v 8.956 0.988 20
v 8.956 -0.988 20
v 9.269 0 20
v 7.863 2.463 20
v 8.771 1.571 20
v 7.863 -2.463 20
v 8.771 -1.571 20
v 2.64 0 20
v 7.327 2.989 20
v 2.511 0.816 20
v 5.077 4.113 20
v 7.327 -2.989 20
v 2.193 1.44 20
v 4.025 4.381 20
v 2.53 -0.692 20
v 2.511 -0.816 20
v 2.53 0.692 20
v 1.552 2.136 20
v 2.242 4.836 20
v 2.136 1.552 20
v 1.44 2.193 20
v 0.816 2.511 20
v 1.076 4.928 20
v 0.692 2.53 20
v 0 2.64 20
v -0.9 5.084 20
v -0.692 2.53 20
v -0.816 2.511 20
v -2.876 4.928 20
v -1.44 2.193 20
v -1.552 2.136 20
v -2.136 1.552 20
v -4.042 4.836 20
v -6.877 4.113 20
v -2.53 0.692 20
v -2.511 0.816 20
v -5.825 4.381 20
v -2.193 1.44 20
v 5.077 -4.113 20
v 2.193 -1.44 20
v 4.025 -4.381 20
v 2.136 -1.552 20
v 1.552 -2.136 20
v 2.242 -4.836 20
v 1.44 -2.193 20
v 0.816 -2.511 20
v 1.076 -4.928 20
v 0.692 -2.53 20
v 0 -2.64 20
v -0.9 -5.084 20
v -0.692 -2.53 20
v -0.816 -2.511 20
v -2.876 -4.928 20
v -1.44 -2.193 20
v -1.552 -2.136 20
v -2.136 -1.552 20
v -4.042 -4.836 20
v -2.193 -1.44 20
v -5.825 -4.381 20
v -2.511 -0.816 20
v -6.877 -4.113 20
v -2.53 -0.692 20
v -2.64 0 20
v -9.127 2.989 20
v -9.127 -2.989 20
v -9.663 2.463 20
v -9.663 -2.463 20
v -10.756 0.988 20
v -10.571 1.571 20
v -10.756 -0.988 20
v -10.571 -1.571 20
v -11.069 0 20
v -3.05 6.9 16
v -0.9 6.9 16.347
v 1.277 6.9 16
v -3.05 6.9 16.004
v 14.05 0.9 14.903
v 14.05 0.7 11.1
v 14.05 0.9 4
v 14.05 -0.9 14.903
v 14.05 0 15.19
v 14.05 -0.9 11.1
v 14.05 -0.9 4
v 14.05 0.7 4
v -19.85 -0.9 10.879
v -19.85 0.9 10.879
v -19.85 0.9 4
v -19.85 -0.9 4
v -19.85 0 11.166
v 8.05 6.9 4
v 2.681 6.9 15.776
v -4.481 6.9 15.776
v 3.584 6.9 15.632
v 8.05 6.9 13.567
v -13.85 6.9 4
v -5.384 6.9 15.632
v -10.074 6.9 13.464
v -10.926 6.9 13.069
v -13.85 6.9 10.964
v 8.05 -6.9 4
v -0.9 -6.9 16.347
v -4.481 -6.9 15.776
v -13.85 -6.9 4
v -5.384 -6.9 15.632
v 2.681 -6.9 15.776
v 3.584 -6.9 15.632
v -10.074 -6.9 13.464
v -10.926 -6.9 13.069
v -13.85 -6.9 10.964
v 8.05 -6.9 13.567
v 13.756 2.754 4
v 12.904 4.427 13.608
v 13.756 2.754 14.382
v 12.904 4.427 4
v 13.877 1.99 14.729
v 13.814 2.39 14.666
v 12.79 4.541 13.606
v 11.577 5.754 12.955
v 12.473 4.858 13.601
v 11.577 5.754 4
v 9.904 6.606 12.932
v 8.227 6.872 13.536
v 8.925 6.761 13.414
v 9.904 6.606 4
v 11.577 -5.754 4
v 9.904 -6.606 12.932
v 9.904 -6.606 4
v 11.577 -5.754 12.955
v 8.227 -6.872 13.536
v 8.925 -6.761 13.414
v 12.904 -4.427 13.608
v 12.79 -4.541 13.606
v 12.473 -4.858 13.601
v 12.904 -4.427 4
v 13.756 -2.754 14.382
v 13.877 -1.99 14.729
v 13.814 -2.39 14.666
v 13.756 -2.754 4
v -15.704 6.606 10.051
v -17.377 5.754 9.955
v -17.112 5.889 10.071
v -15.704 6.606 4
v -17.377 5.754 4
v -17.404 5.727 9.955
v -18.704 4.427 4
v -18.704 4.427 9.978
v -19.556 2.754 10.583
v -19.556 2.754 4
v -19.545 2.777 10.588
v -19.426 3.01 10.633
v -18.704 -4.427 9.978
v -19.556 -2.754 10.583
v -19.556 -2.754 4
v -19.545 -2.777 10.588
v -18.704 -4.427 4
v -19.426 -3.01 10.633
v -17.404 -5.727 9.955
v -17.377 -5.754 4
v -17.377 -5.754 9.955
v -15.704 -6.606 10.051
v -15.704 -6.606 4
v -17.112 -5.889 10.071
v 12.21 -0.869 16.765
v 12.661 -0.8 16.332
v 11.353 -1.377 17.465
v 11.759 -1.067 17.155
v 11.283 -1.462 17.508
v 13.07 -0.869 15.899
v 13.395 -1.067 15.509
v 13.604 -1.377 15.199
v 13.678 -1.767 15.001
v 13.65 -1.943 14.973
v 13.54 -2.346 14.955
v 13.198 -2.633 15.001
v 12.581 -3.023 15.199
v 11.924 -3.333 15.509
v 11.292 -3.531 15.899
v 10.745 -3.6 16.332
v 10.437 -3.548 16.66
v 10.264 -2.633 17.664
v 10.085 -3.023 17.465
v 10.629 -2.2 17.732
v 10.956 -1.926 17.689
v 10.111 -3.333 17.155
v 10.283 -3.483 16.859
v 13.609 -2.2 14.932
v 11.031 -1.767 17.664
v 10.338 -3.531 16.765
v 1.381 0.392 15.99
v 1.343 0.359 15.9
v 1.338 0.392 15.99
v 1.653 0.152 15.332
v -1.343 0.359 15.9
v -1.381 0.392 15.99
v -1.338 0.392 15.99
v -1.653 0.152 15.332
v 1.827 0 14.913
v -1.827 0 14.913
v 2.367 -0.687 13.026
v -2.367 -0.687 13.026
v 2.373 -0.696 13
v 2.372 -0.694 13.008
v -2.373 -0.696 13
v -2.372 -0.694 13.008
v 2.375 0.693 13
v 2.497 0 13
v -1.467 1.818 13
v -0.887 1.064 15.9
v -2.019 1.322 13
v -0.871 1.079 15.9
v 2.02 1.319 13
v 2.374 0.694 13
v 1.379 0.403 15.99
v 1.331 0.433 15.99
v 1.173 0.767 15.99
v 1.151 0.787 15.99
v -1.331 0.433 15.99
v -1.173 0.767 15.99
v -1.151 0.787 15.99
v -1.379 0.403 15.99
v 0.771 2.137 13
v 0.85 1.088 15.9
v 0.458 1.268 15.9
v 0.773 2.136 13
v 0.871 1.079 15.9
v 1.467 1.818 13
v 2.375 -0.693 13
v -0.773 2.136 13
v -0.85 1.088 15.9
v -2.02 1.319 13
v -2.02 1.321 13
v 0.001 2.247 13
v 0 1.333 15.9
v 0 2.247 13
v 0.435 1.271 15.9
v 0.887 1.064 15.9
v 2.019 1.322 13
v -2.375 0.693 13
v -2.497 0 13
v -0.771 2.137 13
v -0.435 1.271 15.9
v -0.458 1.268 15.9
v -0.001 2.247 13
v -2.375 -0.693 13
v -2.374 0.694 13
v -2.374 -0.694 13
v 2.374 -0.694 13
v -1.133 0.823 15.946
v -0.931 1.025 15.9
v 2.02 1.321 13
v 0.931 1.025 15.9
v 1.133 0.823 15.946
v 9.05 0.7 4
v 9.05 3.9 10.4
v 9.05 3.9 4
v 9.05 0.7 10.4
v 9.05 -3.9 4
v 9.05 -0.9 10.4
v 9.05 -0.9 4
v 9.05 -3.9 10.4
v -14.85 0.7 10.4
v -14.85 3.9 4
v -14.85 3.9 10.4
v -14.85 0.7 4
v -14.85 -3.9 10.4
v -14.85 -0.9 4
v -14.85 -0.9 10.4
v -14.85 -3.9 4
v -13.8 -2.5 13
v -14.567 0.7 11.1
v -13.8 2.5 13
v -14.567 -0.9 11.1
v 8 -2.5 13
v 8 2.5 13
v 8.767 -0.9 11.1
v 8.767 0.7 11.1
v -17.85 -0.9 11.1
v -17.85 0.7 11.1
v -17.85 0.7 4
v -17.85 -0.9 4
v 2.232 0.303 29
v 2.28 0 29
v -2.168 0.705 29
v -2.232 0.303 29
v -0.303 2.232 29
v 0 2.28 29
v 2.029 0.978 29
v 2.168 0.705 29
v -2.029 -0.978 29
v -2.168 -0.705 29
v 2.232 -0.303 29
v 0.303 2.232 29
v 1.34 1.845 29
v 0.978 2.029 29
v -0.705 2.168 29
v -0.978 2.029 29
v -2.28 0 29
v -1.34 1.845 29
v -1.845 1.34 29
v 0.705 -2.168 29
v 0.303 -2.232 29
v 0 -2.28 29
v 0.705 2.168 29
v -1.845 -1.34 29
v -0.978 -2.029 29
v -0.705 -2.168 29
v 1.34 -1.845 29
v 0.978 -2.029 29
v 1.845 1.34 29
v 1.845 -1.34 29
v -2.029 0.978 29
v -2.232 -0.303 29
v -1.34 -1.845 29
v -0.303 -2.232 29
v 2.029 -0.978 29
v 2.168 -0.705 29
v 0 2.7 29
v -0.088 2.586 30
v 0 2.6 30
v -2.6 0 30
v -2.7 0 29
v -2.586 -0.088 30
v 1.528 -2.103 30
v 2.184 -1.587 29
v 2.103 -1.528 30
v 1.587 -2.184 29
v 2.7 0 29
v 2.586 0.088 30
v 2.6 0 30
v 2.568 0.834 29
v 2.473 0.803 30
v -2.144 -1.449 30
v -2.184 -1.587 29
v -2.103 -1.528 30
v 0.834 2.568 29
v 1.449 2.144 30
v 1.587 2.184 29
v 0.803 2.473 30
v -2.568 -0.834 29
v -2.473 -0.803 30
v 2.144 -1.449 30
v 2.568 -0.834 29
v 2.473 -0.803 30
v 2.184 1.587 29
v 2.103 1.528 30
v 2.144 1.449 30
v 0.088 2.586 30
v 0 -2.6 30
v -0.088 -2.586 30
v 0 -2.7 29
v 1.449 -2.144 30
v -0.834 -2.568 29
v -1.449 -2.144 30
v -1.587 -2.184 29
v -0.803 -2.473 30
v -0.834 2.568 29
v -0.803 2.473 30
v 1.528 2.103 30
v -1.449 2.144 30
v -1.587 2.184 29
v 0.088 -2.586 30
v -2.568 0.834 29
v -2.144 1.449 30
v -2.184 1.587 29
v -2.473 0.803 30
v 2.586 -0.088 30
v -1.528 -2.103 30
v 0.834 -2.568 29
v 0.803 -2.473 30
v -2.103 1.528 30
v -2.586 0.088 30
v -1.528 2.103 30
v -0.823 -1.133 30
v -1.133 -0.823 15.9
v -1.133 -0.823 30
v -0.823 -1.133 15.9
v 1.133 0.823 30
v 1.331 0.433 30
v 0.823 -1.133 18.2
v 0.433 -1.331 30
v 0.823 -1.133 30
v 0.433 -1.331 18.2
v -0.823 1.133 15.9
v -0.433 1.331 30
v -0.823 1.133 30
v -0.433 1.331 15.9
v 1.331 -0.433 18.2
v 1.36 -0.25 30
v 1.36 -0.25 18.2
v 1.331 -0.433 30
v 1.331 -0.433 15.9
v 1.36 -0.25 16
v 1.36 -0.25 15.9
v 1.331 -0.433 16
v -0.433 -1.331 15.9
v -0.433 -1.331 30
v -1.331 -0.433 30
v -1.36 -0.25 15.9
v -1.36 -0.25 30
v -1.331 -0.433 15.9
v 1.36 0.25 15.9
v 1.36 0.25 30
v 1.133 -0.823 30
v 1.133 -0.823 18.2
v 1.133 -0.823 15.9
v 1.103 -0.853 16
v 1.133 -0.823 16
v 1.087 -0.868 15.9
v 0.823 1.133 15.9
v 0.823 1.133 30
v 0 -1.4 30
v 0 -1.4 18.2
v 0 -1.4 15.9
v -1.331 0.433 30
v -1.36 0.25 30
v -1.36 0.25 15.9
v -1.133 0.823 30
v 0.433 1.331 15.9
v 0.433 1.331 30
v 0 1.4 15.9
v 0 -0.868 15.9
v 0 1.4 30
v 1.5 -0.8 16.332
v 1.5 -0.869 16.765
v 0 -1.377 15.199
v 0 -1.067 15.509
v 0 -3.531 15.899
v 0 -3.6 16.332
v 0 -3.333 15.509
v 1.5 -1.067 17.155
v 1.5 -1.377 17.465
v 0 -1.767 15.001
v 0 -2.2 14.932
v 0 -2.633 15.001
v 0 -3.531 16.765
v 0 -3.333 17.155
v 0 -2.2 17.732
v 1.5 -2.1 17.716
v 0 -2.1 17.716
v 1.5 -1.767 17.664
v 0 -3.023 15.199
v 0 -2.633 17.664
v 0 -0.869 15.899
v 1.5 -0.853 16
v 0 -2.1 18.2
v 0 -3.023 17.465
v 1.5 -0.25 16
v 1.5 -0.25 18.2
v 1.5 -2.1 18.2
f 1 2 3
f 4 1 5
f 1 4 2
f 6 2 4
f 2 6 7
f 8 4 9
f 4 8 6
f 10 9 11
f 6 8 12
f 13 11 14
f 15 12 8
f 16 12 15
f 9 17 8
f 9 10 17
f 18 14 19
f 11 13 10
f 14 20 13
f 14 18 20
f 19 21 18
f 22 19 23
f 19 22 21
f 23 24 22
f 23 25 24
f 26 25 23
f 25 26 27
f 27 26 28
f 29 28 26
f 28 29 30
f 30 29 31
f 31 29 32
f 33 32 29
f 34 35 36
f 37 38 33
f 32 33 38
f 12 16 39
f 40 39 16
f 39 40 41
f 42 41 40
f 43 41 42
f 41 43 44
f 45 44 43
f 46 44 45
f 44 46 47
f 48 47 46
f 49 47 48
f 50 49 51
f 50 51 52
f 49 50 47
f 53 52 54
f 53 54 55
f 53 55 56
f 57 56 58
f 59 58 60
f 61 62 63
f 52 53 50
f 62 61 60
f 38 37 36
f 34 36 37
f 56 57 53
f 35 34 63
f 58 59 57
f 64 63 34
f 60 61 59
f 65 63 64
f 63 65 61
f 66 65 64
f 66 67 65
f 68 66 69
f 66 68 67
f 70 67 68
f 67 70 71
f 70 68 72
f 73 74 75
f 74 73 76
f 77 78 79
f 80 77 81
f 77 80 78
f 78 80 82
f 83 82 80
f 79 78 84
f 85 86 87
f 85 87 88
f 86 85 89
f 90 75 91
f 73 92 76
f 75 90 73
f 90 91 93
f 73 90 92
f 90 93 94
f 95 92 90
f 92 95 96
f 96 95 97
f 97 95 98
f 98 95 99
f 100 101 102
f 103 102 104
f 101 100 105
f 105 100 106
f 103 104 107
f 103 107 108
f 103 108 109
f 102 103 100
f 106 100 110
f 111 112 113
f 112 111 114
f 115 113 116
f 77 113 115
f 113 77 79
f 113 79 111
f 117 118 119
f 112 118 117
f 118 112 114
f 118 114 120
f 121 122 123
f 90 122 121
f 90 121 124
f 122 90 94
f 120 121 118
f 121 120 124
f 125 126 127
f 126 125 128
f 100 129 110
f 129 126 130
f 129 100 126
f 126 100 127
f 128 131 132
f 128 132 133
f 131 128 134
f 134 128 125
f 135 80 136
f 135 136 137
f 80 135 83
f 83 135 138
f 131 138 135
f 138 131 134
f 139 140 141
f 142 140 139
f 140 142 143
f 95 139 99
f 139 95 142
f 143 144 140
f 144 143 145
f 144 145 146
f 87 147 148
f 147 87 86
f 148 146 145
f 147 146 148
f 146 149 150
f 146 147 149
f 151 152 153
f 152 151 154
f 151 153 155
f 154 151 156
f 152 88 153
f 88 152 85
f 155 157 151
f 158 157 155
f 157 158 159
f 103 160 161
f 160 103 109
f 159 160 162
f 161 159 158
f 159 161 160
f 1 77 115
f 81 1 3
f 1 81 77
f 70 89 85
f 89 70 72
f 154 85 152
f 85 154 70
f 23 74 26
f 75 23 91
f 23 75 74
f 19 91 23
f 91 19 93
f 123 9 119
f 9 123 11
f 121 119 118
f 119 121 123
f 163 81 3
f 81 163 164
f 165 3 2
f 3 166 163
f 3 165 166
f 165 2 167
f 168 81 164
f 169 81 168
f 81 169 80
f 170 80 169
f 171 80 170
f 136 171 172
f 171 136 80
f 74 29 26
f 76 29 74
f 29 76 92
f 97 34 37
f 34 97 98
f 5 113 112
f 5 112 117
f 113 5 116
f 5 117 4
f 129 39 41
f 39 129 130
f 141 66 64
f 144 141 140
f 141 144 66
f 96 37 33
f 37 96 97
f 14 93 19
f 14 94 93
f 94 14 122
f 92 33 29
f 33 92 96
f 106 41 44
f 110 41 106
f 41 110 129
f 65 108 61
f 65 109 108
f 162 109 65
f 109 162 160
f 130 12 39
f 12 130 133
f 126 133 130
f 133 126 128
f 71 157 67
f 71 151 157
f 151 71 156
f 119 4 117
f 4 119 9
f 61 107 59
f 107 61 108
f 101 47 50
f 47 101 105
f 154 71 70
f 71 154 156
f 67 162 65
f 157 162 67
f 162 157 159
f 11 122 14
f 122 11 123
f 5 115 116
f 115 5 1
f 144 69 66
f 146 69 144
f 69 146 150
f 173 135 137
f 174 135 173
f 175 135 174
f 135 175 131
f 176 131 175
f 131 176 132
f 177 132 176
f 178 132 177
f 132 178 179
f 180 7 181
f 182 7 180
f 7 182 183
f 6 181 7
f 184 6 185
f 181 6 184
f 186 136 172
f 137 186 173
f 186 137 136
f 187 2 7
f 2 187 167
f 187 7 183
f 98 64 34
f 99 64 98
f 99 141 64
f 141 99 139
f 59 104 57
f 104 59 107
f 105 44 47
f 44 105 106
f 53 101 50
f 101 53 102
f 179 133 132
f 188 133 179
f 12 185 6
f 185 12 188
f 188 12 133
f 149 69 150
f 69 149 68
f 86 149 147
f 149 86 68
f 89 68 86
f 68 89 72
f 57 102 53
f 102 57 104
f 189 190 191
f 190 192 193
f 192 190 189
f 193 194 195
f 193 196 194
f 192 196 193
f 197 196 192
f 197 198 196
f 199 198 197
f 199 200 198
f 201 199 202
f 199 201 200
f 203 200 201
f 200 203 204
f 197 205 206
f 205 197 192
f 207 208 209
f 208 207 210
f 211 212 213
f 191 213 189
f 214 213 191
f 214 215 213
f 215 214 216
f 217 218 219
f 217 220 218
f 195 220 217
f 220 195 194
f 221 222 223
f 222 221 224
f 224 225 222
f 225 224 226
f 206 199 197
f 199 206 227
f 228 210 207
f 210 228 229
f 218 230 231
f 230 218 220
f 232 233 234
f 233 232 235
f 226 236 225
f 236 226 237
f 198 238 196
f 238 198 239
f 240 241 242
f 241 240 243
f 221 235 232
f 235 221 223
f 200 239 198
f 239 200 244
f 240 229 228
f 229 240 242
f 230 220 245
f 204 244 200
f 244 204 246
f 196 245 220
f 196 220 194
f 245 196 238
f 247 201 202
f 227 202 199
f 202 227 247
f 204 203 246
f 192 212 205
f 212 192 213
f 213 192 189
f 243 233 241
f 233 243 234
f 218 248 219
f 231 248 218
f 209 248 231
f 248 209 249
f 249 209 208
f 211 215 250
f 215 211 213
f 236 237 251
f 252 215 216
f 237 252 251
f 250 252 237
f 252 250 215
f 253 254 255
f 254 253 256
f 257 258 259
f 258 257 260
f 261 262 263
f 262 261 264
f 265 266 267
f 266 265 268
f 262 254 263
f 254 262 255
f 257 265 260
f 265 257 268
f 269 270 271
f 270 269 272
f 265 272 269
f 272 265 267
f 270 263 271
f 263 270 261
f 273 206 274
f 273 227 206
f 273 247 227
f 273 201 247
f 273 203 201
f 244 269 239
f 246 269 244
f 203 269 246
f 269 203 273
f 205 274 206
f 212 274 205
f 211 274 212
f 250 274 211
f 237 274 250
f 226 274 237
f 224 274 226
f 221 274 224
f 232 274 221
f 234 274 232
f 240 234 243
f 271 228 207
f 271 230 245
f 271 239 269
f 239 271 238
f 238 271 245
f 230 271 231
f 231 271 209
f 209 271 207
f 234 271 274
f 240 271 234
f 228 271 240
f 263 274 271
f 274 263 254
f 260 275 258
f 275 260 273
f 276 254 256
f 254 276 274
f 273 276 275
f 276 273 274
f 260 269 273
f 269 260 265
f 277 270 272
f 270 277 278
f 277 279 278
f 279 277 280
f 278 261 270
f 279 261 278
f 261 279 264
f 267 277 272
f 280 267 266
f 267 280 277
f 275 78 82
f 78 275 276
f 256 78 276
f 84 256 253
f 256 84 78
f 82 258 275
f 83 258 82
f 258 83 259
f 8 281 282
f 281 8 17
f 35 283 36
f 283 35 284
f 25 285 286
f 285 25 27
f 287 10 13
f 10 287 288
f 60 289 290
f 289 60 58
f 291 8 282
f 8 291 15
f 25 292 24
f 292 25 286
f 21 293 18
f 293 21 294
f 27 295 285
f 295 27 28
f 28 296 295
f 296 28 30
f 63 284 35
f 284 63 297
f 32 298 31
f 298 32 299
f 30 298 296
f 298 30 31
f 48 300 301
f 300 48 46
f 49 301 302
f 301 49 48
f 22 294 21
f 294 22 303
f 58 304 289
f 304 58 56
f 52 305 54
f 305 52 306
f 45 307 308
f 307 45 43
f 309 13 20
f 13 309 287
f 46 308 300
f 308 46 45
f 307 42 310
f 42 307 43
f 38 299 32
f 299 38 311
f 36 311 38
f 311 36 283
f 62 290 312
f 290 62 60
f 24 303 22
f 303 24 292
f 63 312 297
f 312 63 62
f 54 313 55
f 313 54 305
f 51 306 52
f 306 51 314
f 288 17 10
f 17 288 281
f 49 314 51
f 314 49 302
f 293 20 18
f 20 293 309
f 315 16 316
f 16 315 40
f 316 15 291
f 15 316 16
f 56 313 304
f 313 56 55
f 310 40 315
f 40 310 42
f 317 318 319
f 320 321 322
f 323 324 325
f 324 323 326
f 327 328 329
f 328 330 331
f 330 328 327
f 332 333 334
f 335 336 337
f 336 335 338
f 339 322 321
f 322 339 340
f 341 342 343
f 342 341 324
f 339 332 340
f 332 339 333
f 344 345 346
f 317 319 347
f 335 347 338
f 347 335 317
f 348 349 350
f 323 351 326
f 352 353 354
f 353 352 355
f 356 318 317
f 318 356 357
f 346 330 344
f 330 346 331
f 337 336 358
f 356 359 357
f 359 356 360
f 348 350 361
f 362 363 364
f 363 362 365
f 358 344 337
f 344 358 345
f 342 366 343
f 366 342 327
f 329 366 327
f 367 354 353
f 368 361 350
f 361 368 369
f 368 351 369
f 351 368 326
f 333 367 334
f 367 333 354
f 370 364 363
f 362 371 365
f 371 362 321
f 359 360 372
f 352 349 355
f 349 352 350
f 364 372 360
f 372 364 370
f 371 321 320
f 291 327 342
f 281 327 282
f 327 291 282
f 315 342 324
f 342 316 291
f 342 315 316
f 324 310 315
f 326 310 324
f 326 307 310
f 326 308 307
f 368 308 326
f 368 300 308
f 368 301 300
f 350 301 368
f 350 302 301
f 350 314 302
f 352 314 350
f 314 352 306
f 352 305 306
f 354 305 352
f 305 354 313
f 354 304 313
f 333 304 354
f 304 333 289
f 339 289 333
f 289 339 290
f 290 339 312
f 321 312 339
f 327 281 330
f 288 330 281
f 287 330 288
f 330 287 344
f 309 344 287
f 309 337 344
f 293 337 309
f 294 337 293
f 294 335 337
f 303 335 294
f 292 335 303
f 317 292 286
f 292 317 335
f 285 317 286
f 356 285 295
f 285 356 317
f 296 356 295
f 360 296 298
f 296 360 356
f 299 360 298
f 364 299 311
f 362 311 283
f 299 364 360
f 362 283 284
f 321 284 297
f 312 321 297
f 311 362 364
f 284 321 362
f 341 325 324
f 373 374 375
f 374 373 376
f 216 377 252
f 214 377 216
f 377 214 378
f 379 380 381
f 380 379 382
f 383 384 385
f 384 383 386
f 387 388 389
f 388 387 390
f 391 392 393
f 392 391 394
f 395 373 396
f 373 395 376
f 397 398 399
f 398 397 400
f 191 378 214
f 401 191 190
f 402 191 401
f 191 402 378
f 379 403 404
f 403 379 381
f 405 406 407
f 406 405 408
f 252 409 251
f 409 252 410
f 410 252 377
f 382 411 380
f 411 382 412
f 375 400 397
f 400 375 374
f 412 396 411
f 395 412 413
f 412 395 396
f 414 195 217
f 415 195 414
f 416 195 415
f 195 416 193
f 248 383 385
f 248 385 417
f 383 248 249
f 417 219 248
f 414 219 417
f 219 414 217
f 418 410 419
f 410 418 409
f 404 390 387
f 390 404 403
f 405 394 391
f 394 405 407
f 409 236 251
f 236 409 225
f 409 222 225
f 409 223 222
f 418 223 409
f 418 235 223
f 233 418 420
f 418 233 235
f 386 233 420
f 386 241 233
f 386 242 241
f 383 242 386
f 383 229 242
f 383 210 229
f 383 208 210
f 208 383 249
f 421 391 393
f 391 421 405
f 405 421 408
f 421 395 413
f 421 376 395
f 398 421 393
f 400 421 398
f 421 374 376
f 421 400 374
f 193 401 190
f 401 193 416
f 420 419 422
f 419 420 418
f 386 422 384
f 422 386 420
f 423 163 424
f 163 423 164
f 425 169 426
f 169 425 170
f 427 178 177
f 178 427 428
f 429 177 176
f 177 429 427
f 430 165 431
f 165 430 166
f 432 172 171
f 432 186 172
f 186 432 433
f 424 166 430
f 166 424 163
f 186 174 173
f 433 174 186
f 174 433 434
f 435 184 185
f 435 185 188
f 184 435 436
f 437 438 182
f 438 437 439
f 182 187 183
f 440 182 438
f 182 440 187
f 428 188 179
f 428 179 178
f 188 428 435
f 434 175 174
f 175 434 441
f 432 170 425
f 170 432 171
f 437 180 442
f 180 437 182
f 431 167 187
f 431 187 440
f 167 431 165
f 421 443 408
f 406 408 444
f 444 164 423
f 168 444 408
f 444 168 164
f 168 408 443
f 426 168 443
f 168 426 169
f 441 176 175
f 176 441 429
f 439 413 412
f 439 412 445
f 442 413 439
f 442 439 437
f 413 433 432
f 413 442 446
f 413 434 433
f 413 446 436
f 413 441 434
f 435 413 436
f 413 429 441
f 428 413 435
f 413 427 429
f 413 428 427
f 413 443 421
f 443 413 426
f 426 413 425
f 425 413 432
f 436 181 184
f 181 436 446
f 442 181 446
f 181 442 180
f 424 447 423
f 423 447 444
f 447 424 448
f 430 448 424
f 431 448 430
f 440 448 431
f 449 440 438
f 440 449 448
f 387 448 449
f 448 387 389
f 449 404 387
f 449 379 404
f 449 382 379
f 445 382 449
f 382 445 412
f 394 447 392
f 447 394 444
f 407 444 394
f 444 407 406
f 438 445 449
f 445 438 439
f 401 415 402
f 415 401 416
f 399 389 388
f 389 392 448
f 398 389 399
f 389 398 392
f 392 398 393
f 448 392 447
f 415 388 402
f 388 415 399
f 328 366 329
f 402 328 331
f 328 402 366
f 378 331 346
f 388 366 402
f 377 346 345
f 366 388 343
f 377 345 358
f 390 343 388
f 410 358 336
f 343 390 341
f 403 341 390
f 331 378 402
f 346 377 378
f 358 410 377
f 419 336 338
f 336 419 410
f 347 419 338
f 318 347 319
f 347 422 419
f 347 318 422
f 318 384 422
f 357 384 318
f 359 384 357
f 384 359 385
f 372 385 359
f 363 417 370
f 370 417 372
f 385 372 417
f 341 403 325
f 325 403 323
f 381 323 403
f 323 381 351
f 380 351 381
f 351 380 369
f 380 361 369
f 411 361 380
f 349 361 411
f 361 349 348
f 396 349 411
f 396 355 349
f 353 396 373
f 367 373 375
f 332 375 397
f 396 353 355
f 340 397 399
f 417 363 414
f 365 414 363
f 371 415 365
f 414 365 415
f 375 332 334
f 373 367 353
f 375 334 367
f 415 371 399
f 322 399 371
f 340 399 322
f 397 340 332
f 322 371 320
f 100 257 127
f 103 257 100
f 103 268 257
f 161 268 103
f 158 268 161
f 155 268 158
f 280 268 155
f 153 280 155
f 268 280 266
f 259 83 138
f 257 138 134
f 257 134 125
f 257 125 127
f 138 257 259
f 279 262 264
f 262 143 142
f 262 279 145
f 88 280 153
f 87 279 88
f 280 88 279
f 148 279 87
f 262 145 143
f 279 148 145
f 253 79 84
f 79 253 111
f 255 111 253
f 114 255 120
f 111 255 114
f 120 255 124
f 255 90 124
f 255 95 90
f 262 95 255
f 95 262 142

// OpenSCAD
////use $fn=1000 for manufacturing. 
// rendering with 1K facet number is taking 8 minutes
$fn=20; 

// mic dimentions
    hHousing=2.6;
    hBottomBox=hHousing*4;
    hMicSpace=3;
    rCable=0.7;
    rBendCable=3;
    bottomL=23.9;
    bottomW=7.8;
    topL=21.8;
    topW=5;
    dw=3; // wall width at W
    dl=2; // wall width at L
    
    speakerAngle=120;

// tip dimensions
    ht=20;        // hight of tip from top of main housing
    r1t=2.7;      // bottom radius of the tip
    r2t=2;      // top radious of the tip
    rTipHole=r2t*0.7; // radious of tip hole
//tips();
//backPlate();
difference()
{
union()
{
drawWithCut(30, 30, 30, 0, cube=false);
//drawWithCut(-20,50.25,0,0);

//drawAll();
//scale([0.97,0.93,1])bottom();
}
translate([0,0,-246])
cube(500,center=true);
}
//tips();
//mic();
//micHousing();
//micOuter();
//trim2(0,5,6,10);
 module bottom()
 {
     dy=9;
     dx=31;
     bh=6.4;
     translate([dx+5,0,0])
   difference()
   {
     union()
     {
     translate([-dx/2,-dy/2,0])
     cube([dx,dy,bh]);
     translate([9.5,rCable,bh])
     cableBend();
     }
     
    translate([(topL/2-8),0,0])
     drawAll();

     //translate([-8-2,-dy/2-1,5])
       //cube([11,dy+2,3]);
   }
         
 }

module torus(r1=10.2,r2=2.2)
{
  rotate_extrude()
    translate([(r1-r2)/2, 0, 0])
        circle(r = r2/2);
}

module drawAll()
{
    difference()
    {
    union()
    {
      mic();
      translate([0,0,hHousing+hBottomBox+hMicSpace])
      tips();
    }
    translate([0,0,hHousing+hBottomBox+hMicSpace])
    tipHoles();
    }
    
    tipWall();
}

module tips()
{
  tip();
}

module tipHoles()
{
    dh1=4;
    st0=0.6;

    h0=ht+(dh1)*sin(speakerAngle);
      // re-drill both holes
      translate([0,0,-0.1])
      cylinder(h=ht+2,r=rTipHole);

      translate([0,0,r2t*sin(speakerAngle)])
      //rotate([speakerAngle,0,0])
      //cylinder(h=h0,r=rTipHole+0.2);      
    translate([0,-rTipHole-0.8,-rTipHole])
    rotate([0,90,0])
    cylinder(h=h0,r=1.4);
    translate([0,-2.1,0])
    cube([1.5,2.1,2.2]);   
}

module tipWall()
{
    translate([0,0,ht/2+hHousing+hBottomBox+hMicSpace])
    cube([(r2t+rTipHole),0.5,ht+0.6],center=true);
}

module mic()
{
    translate([-(topL/2-8),0,0])
    difference()
    {
        micOuter();
        micHousing();
      snipPins();
    }
}

module micOuter()
{
    rTrim=6;
    l=bottomL+2*rBendCable+dl*2; // 1.5mm wall width from cable bend
    w=bottomW+dw*2; // 3mm wall width
    translate([-l/2,-w/2,0])
    difference()
    {
        union()
        {
        cube([l,w,hHousing+hBottomBox+hMicSpace+2*r2t]);
        
        // upper cube to connect tips
    translate([(topL/2-8)+topL/2+2*r2t+r2t,w/2,hHousing+hBottomBox+hMicSpace])
    {
          difference()
          {
            translate([-r2t-1,-w/2,0])
              cube([2*r2t+2,w,2*r2t]);
            cylinder(h=2*r2t,r=r2t);          
          }
      }  
  }      
      trim2(0,rTrim,l,w,hHousing+hBottomBox+hMicSpace);
        trim2(-90,rTrim,l,2*rTrim,hHousing+hBottomBox+hMicSpace);
        trim2(90,rTrim,2*rTrim,w,hHousing+hBottomBox+hMicSpace);
        trim2(180,rTrim,2*rTrim,2*rTrim,hHousing+hBottomBox+hMicSpace);
  
    translate([l/2+2,w/2,4])
    scale([1,0.5,1])
        difference()
        {
            cylinder(
                h=6*hHousing+hBottomBox+hMicSpace,
                r1=1.2*bottomL,
                r2=bottomL*22);
            cylinder(
                h=3*hHousing+hBottomBox+hMicSpace,
                r1=1.2*bottomL/1.1,
                r2=5);
        }
    }
}

module trim2(teta,r,l,w,h)
{
    translate([l-r,w-r,0])
    rotate([0,0,teta])
    {
    difference()
    {
     cube([r+0.01,r+0.01,h]);
     cylinder(h=h,r=r);
    }
    }
}

module micHousing()
{
    // bottom large box
    translate([-bottomL/2,-bottomW/2,0])
    cube([bottomL,bottomW,hBottomBox]);

    // top part for the mic
    translate([0,0,hBottomBox])
    cube2(hHousing,bottomL,bottomW,topL,topW);
    
    // space
    translate([topL/2-8,0,hBottomBox+hHousing-0.01])
    difference()
  {
    scale([1,0.9,1])
    cylinder(h=hMicSpace,r1=2.5,r2=1.45);
        
    translate([-10,-0.7,0])
    union()
    {
    translate([0,-20,0])
    cube(20);
    difference()
    {
    cube(20);
    rotate([-20,0,0])
    cube(30);
    }
    }
  }
    
    // right cable bend
    translate([-bottomL/2,rCable,hBottomBox+rCable])
    cableBend();

    // left cable bend
    translate([bottomL/2,rCable,hBottomBox+rCable])
    cableBend();
}

module cableBend()
{
    r0=rCable*2+0.2;
    h0=(hBottomBox+4*rCable)+0.1;
    translate([-rBendCable,-r0,-h0])
    cube([2*rBendCable+4,r0,h0]);
}

module cube2(h,bottomL,bottomW,topL,topW)
{
    w=bottomW;
    dw=(bottomW-topW)/2;
    l=bottomL;
    dl=(bottomL-topL)/2;
    translate([-l/2,-w/2,0])
    polyhedron(
       points= [
        [0,0,0],
        [0,w,0],
        [l,w,0],
        [l,0,0],
        [dl,dw,h],
        [dl,w-dw,h],
        [l-dl,w-dw,h],
        [l-dl,dw,h]],
      faces=[
          [0,1,2,3],  // bottom
          [4,5,1,0],  // front
          [7,6,5,4],  // top
          [5,6,2,1],  // right
          [6,7,3,2],  // back
          [7,4,0,3]] // left
        );
}

module tip()
{
  cylinder(h=ht,r1=r2t*1.4,r2=r2t);
  translate([0,0,ht-7])
    cylinder(h=7,r1=r1t,r2=r2t);
}

module drawWithCut(x=0,y=0,z=0,t=0,cube=false)
{
    difference()
    {
        drawAll();
        drawCubeToSubstract(x,y,z);
   }
   if (cube)
   {    
       drawCubeToSubstract(x,y,z);
   }
}

module drawCubeToSubstract(x=0,y=0,z=0)
{
    translate([x, y,z])
    translate([-50,-50,0])
    translate([0, 0,0])
    cube([100, 50, 50]);
}

module testChamber()
{
    scale([1,yScale,1])
    difference()
    {
    cylinder(h=40,r=ld+3);
        
    translate([0,0,20])
      cylinder(h=40,r=sd);
    
    translate([0,0,h0+ht+21.7])
    rotate([180,0,0])
    outerBulk();
    }
}

module tipBlocker()
{
    tolerance=0.04;
    difference()
    {
    cylinder(h=5,r=4);
    translate([0,0,h0+ht+3])
    rotate([180,0,0])
    scale([1+tolerance,1+tolerance,1])
    draw2();
    translate([0,0,h0+ht+3])
    rotate([180,0,0])
    scale([1-tolerance,1-tolerance,1])
    draw2();
    }
}

module circularWallWithGap(height=2,innerRadius=11,width=1,
gapAngle=90)
{
    difference()
    {
        cylinder(h=height,r1=innerRadius+width,r2=innerRadius+width,center=false);
        cylinder(h=height,r1=innerRadius,r2=innerRadius,center=false);
        //translate([20,-innerRadius*1.5,0])
        //cube([3*innerRadius,3*innerRadius,height]);
    }
}

module snipPins(lowerHead=1)
{
  /*  
    sx=0;
    sy=0;

    snipPin(sx,sy, lowerHead);
    */
}


module snipPin(x=0,y=0,lowerHead=1)
{
    y0=-bottomW/2-dw+1;
    // M3 screw, 5mm
    translate([x,y0,3])
    rotate([-90,0,0])
    cylinder(h=20,r1=1.1,r2=1.1);
    
    translate([x,y0-2,3])
    rotate([-90,0,0])
    cylinder(h=2,r1=2,r2=2);

    // head space at the bottom
    if(lowerHead==1)
    {
    // one edge is 4mm.
    translate([x,-y0,3])
    rotate([-90,0,0])
    cylinder(h=1,r=2.31,$fn=6);
    //linear_extrude(20)    circle(2.31,$fn=6);
    }        
}

module backPlate()
{
    t0=3.5*hHousing;
    t1=1.5;
    h0=3;
    
    difference()
    {
      micOuter();
      translate([0,0,100+t0])
      cube([200,200,200],center=true);
      translate([(topL/2-8),0,t1])
        drawAll();
        
    translate([0,0,t1])
        snipPins();
      
    // top part for the mic
    translate([0,0,t0+0.01])
    rotate([180,0,0])
    cube2(hHousing,bottomL,bottomW,topL,topW);

      //remove space for cable
      translate([rCable-bottomL/2-rBendCable,-rCable,t1])
      cube([2*rCable,2*rCable,6]);
    }
}
